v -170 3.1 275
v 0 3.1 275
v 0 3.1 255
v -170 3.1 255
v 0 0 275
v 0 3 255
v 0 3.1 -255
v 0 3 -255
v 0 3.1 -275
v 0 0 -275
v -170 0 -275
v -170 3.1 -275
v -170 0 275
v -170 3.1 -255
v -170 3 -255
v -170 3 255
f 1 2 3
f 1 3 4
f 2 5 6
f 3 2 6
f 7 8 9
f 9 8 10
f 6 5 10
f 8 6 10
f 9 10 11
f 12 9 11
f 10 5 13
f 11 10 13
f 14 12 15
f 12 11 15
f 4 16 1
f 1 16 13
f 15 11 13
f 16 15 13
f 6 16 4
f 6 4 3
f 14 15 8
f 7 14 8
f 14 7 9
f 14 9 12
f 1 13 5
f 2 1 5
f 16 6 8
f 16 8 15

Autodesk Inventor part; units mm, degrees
ref_plane "YZ Plane" through (0, 0, 0) normal (1, 0, 0) x (0, 1, 0)
ref_plane "XZ Plane" through (0, 0, 0) normal (0, 1, 0) x (-1, 0, 0)
ref_plane "XY Plane" through (0, 0, 0) normal (0, 0, 1) x (1, 0, 0)
sketch "Sketch1" plane through (0, 0, 0) normal (0, 1, 0) x (-1, 0, 0)
  line L0 (170, 275) -> (0, 275)
  line L1 (0, 275) -> (0, -275)
  line L2 (0, -275) -> (170, -275)
  line L3 (170, -275) -> (170, 275)
  line L4 (170, 255) -> (0, 255)
  line L5 (170, -255) -> (0, -255)
  point P0 (0, 0)
  point P1 (0, 0)
  dimension "d0" = 170
  dimension "d1" = 550
  dimension "d4" = 20
  dimension "d5" = 20
extrude "Extrusion1" add sketch "Sketch1" along normal blind 3
extrude "Extrusion2" add sketch "Sketch1" along normal blind 3.1 contours L3 L4 L1 L0 | L3 L2 L1 L5
equation "\"d1\" = track_width"
equation "\"d4\" = curb_width"
equation "\"d5\" = curb_width"
equation "\"d2\" = track_height"
equation "\"d6\" = track_height + curb_height"
equation "\"track_width\" = 550"
equation "\"curb_width\" = 20"
equation "\"track_height\" = 3"
equation "\"curb_height\" = 0.1"
properties part number "intersection_extension"
